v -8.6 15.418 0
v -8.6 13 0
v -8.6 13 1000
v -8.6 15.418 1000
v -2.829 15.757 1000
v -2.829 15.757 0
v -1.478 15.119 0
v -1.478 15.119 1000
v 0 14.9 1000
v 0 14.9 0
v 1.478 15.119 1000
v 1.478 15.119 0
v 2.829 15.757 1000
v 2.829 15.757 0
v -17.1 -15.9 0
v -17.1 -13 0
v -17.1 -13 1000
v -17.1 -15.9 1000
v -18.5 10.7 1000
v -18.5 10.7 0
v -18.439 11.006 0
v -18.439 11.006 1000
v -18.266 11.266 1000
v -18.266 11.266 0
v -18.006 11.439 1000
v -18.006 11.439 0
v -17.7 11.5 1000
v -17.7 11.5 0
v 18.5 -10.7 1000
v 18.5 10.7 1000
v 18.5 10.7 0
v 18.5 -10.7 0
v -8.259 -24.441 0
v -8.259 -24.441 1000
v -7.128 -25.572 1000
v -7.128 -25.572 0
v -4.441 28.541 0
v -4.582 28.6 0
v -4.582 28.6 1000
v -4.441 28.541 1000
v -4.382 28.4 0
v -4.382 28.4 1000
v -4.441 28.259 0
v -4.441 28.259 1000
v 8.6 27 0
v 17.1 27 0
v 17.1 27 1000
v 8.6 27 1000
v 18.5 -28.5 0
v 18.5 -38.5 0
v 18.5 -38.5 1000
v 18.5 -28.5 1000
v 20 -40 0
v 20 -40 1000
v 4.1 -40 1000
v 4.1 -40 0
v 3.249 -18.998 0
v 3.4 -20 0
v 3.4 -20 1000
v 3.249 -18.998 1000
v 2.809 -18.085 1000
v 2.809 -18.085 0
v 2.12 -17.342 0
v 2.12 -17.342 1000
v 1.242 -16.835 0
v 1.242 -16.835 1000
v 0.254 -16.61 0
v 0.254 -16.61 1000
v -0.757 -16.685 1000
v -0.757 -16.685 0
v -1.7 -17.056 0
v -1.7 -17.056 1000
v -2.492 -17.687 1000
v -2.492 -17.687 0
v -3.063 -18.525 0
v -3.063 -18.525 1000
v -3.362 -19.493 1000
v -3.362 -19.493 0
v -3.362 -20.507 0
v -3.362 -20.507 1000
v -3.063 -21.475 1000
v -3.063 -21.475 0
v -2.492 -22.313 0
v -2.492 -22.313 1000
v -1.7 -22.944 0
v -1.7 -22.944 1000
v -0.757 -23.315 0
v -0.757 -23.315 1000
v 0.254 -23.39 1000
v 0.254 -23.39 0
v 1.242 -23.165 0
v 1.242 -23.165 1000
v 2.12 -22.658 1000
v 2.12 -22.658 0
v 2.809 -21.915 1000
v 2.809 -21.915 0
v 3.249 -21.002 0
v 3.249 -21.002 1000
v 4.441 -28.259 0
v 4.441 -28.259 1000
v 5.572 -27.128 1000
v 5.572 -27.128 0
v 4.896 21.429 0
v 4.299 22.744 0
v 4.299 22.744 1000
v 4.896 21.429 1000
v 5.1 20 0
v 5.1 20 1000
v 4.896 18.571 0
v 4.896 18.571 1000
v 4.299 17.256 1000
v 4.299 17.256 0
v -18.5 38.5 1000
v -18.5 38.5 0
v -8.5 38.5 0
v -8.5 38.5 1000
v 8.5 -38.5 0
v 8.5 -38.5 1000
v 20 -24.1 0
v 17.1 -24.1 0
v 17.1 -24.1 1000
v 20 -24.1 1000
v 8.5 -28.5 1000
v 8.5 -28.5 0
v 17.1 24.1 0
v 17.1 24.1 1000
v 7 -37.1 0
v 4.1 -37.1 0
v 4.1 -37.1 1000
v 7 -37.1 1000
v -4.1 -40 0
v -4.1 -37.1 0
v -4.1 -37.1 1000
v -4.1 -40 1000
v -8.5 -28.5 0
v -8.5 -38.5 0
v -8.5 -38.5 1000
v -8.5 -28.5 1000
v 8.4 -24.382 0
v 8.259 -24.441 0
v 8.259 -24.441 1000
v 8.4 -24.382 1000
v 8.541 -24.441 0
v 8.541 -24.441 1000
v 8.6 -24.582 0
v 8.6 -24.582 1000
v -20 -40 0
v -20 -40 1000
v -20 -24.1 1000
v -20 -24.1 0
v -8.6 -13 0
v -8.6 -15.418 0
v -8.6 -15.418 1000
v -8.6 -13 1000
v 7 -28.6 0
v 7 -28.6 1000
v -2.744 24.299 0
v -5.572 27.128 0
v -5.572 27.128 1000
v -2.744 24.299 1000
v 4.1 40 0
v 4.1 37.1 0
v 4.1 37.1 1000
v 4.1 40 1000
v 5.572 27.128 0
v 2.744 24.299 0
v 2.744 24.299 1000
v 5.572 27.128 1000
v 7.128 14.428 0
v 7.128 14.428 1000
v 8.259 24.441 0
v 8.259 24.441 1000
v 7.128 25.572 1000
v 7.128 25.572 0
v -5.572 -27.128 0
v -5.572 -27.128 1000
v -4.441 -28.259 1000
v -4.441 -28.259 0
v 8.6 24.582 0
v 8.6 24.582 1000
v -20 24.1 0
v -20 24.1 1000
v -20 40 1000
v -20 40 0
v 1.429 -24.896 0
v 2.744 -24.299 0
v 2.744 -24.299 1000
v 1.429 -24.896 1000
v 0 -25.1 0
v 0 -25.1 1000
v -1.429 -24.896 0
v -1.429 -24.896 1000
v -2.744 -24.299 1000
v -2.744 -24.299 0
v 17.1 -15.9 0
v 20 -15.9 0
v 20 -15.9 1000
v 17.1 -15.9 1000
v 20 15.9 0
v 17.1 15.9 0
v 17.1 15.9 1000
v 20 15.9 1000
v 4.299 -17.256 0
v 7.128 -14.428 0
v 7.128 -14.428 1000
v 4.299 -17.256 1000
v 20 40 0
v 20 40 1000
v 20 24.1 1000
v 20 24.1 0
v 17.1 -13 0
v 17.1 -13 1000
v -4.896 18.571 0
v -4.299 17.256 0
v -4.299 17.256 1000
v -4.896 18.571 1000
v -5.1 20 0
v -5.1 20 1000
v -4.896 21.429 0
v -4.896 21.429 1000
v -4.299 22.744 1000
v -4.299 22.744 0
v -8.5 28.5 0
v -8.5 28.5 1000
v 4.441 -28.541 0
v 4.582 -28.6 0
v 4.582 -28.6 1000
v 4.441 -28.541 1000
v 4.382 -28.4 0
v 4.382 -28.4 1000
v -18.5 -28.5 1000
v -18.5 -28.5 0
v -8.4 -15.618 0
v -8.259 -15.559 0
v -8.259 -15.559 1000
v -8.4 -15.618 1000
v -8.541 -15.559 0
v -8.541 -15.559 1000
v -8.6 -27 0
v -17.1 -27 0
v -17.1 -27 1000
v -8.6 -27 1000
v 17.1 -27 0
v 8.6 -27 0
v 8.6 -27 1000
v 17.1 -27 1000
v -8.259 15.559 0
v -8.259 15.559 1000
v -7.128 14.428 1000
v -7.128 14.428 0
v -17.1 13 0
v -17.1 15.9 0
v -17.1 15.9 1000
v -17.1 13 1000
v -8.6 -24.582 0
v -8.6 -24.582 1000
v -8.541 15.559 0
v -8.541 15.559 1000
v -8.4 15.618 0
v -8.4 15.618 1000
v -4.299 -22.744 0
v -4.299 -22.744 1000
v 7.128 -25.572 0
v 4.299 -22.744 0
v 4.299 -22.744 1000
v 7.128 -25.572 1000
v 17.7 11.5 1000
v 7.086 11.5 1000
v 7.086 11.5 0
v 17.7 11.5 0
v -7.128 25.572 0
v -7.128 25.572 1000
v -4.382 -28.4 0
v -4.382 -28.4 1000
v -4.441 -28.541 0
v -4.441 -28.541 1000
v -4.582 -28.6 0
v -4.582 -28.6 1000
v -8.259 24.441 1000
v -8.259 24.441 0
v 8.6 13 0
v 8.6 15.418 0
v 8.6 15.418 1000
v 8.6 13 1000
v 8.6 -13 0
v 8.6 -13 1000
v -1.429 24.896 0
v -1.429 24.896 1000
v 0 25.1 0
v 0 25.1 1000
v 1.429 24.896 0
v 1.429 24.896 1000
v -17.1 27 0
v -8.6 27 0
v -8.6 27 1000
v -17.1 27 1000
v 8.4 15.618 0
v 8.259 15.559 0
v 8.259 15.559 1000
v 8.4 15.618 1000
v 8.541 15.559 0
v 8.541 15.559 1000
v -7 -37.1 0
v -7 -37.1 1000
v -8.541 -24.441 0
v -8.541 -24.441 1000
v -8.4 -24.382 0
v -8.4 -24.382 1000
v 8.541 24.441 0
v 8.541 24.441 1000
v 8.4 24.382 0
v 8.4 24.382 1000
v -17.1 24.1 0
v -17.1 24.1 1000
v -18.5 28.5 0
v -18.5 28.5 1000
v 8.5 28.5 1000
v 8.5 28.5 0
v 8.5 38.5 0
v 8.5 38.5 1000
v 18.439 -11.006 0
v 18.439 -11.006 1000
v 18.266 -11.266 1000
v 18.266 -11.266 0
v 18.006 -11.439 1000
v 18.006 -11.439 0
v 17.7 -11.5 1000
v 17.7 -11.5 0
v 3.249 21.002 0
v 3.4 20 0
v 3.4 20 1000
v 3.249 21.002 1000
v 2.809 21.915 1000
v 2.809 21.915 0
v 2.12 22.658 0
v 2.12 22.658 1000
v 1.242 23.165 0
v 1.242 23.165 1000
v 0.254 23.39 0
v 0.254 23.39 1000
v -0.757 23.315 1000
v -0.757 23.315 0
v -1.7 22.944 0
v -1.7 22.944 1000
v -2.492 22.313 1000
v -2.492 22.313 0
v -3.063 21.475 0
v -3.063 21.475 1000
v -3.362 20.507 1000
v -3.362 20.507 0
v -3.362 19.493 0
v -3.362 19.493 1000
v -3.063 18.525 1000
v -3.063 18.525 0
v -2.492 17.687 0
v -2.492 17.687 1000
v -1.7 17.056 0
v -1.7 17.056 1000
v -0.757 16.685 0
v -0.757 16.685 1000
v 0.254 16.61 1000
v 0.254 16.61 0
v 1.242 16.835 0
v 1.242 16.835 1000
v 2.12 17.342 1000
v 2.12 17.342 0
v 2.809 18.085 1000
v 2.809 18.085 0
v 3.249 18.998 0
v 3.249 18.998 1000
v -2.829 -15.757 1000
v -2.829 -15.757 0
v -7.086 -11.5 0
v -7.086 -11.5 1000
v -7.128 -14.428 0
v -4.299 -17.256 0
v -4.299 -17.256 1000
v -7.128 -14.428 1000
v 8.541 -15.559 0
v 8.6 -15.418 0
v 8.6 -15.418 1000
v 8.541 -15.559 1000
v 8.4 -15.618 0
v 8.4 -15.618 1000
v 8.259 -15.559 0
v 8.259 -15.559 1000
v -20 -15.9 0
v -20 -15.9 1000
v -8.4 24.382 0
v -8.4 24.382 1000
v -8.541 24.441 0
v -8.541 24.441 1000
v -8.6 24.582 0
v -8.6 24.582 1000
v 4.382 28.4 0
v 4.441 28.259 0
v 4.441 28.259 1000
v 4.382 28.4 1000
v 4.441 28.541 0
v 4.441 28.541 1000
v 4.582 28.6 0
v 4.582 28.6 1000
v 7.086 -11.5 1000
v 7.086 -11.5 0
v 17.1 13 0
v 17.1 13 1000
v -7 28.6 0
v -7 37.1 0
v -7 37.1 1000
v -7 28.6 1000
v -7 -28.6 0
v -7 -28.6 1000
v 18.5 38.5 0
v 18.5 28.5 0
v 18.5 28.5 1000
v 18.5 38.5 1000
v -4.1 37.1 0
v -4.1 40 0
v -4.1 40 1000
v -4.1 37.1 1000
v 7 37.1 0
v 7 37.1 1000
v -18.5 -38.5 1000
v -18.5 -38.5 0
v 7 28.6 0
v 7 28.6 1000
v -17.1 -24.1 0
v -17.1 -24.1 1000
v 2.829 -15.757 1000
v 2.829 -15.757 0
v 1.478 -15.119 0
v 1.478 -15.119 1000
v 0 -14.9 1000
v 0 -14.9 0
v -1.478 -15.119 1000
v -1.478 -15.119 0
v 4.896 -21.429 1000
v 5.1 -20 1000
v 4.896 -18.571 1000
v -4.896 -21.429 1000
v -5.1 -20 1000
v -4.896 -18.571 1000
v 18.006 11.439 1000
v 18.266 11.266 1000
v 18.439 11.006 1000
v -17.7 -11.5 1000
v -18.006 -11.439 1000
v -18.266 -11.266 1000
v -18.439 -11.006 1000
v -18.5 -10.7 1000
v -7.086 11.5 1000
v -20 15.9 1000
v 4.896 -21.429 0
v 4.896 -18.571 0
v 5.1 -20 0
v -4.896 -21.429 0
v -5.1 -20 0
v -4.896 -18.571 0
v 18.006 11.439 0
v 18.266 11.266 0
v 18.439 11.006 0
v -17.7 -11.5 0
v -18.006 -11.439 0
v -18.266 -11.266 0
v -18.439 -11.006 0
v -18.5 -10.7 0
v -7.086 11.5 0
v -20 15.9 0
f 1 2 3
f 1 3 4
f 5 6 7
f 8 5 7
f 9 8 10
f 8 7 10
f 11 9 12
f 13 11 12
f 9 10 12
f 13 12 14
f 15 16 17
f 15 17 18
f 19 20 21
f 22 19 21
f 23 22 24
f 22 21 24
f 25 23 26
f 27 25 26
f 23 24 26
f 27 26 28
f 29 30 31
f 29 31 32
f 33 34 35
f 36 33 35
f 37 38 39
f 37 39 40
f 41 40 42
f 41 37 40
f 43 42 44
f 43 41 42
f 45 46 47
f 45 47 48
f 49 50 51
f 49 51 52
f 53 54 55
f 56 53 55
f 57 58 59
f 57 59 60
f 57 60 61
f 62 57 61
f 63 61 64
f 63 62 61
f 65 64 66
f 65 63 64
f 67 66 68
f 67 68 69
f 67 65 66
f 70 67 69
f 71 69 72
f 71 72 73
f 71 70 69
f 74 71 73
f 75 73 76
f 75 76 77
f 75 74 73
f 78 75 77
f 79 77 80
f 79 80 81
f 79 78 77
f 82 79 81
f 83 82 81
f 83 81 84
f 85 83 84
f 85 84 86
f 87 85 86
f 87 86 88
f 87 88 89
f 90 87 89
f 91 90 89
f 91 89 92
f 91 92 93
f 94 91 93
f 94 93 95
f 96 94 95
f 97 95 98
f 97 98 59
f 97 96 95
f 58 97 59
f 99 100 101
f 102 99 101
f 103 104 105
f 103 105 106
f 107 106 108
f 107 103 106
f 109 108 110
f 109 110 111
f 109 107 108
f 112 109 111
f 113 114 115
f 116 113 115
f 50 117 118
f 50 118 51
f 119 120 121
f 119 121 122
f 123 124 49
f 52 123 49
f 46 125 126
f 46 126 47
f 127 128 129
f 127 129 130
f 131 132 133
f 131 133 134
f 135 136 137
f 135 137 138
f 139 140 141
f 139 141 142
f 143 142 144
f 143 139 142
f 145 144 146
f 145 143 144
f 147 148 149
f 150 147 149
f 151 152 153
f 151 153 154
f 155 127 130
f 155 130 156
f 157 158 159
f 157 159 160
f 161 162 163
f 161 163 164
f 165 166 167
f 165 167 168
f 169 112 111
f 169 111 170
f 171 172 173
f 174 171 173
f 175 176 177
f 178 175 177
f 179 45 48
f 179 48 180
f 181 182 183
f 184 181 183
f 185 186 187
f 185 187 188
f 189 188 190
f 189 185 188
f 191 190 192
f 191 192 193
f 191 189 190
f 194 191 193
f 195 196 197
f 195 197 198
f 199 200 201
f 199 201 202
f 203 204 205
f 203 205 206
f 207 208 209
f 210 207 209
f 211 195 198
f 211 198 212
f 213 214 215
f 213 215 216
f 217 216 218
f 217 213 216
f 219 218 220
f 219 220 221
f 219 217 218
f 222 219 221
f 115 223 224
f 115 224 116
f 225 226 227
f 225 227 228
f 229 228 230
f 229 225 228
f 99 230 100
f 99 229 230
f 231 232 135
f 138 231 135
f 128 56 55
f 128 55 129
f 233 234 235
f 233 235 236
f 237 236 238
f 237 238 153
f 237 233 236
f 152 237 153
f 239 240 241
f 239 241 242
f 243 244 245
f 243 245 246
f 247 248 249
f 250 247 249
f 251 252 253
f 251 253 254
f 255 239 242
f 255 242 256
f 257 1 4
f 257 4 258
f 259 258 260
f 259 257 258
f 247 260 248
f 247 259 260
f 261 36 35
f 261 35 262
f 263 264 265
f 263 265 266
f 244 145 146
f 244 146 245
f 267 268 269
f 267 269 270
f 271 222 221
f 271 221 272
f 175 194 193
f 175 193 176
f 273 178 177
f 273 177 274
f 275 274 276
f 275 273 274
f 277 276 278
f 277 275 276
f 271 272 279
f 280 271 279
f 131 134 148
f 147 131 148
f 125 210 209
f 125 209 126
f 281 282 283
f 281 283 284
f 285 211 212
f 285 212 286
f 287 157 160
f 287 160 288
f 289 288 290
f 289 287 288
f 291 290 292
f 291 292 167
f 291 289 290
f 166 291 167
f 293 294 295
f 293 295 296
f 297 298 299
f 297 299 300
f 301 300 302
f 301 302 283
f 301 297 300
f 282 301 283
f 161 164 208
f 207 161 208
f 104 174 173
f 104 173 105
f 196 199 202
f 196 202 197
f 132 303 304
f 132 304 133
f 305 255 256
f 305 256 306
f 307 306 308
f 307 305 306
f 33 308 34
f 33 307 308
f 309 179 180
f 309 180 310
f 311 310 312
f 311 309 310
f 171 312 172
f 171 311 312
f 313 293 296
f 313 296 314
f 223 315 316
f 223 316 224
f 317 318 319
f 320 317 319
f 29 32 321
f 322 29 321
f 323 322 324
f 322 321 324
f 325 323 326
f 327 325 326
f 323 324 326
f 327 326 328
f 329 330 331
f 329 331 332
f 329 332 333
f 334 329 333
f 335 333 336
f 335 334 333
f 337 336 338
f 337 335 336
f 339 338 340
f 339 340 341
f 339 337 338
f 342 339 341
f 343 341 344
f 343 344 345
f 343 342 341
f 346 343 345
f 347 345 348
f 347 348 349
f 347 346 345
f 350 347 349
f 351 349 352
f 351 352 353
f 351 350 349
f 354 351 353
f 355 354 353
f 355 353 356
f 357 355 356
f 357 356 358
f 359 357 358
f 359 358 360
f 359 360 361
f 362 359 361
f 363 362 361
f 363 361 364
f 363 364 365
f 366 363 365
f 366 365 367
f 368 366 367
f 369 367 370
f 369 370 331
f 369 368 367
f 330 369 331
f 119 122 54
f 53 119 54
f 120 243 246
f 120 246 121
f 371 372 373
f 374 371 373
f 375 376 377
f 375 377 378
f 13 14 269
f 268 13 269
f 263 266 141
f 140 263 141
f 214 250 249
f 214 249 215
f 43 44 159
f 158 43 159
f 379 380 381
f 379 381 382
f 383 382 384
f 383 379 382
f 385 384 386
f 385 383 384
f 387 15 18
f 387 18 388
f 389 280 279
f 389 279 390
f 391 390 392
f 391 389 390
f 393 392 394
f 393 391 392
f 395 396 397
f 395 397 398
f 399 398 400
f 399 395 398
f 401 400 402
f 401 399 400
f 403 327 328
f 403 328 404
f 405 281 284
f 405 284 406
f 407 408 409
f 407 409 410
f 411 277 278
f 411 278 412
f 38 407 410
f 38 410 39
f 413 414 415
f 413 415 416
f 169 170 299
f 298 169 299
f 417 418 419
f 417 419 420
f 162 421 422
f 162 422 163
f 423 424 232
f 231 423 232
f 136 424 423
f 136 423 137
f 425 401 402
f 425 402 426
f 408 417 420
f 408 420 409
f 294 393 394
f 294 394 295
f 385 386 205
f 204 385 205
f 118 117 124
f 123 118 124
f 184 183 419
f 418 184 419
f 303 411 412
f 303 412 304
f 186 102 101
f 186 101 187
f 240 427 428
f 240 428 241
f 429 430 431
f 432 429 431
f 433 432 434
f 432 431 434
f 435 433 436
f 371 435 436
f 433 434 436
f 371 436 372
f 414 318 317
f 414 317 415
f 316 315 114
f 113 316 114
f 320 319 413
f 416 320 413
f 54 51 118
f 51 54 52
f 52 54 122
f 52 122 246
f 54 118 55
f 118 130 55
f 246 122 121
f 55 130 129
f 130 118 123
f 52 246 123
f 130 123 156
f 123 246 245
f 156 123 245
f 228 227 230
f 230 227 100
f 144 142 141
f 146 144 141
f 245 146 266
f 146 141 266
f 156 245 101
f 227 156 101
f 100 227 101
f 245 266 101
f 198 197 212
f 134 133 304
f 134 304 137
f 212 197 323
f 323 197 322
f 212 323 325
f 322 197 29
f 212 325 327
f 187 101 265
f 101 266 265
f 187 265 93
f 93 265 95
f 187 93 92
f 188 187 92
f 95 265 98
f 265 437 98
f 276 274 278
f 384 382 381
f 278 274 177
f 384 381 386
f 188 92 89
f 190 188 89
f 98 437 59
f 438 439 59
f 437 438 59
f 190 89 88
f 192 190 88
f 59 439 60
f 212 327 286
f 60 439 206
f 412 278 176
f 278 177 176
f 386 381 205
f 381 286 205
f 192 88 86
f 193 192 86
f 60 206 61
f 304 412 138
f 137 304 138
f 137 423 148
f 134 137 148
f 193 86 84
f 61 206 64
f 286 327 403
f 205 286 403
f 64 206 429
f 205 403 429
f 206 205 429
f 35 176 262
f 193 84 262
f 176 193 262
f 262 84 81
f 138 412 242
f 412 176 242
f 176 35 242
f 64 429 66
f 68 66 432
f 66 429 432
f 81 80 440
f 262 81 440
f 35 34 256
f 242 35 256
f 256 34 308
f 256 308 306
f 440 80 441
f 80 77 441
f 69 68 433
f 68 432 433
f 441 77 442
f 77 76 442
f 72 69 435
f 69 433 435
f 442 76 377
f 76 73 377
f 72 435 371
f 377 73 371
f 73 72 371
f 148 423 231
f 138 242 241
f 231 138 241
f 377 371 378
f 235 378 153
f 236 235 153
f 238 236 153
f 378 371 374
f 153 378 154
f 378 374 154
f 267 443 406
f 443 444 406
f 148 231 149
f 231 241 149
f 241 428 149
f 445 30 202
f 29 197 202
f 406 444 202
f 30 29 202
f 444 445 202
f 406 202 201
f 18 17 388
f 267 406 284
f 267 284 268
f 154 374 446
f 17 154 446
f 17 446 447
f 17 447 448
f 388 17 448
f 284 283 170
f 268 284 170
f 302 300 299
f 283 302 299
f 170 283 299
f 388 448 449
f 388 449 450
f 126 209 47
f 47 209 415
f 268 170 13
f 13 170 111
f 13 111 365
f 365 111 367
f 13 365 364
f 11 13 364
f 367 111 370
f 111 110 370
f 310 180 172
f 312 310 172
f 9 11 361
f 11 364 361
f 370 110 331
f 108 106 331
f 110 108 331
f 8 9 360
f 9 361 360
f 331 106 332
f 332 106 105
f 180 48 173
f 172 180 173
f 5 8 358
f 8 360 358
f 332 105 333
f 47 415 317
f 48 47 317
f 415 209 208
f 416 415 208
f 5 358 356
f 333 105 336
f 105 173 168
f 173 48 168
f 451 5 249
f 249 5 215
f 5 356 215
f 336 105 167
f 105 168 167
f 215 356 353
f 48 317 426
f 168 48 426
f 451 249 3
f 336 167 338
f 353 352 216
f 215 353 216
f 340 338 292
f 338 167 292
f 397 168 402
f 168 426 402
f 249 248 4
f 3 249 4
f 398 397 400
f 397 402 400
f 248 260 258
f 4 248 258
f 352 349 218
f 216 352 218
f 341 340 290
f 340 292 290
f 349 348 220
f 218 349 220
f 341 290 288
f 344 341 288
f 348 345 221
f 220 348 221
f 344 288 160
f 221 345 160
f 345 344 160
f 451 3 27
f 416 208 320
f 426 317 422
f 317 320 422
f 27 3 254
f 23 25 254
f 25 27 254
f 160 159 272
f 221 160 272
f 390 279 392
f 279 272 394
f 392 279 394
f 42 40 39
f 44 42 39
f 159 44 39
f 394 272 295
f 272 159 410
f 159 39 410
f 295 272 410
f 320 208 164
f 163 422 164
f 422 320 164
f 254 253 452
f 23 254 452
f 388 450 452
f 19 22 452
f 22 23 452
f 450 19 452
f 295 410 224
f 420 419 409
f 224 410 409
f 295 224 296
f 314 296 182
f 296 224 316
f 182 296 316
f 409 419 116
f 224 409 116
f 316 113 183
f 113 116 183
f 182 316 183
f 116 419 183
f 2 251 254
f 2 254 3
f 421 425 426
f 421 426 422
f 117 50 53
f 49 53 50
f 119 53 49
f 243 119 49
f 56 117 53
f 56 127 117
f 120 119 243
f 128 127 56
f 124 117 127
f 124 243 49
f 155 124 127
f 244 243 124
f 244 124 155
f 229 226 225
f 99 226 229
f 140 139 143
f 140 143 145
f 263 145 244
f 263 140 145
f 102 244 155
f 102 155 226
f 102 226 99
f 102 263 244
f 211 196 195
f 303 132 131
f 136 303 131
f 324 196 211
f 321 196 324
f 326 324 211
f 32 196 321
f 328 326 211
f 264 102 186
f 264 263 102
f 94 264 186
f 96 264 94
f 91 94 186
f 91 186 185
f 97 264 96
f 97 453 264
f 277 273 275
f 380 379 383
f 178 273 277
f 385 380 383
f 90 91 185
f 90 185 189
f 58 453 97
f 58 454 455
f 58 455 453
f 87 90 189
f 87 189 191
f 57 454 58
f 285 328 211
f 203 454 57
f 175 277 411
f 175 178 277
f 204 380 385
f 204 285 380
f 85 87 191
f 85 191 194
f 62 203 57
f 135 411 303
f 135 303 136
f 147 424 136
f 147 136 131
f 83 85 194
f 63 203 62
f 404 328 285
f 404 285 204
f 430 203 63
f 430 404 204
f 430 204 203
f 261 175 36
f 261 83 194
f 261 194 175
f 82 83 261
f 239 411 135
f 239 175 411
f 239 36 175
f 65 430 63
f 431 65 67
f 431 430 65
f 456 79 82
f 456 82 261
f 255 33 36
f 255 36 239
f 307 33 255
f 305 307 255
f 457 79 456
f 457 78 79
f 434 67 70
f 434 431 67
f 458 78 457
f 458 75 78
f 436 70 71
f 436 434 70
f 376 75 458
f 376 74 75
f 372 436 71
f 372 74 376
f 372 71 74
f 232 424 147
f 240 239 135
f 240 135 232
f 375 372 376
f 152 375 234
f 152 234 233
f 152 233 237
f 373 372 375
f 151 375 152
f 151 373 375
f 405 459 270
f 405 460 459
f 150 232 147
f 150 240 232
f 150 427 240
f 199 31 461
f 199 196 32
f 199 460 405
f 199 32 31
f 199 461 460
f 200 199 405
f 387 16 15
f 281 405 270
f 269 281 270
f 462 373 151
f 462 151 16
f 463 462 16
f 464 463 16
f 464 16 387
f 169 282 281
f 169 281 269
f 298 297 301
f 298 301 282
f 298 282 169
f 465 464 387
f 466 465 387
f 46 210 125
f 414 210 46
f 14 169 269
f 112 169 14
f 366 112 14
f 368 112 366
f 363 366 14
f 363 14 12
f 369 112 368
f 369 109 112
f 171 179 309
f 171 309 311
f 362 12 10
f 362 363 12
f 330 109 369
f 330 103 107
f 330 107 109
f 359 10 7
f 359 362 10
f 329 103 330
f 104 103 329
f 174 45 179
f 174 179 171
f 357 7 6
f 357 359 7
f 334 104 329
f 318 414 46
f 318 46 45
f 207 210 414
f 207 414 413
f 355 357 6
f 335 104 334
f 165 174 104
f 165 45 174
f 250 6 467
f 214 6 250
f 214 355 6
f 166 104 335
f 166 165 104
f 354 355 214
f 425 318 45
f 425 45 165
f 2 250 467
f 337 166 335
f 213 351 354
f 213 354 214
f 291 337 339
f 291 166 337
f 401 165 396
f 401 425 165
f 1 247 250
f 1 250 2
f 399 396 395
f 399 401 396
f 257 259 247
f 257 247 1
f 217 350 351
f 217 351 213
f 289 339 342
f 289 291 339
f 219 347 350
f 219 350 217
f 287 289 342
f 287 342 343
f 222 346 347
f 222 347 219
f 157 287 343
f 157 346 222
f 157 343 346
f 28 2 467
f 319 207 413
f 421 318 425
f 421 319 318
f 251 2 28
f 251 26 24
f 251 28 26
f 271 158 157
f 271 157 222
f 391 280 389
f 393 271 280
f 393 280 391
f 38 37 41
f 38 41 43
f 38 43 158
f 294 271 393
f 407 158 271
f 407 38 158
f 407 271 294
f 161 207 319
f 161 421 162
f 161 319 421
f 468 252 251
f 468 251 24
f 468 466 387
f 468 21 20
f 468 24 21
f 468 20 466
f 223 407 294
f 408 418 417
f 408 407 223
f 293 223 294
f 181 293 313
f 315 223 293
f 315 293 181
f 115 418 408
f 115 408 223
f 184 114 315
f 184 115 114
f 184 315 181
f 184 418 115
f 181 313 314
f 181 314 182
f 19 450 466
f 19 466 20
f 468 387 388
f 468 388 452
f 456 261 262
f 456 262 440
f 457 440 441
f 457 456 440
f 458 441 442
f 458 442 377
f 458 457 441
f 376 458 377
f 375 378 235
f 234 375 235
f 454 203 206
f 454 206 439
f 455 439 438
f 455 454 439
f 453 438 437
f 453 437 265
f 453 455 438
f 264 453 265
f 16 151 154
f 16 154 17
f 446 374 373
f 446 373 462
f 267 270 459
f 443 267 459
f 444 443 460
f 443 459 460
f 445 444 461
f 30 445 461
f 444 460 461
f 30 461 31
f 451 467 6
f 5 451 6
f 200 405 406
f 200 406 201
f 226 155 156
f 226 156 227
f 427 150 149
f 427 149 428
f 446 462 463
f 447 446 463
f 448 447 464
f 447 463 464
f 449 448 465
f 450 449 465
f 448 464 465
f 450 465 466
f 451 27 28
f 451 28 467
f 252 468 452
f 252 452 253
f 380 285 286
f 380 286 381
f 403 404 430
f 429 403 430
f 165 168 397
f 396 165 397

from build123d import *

# Parameters (mm, degrees)
SKETCH_1_R      = 3.4
SKETCH_1_W      = 10
SKETCH_1_H      = 10
EXTRUDE_1_DEPTH = 1000


with BuildPart() as part:
    # Эскиз1 → Бобышка-Вытянуть1 (new body)
    with BuildSketch(Plane.XY):
        with BuildLine():
            Line((-20, 27), (-20, 40))
            Line((-20, 40), (-7, 40))
            Line((-7, 40), (-4.1, 40))
            Line((-4.1, 40), (-4.1, 37.1))
            Line((-4.1, 37.1), (-7, 37.1))
            Line((-7, 37.1), (-7, 28.6))
            Line((-7, 28.6), (-4.582423707, 28.6))
            ThreePointArc((-4.582423707, 28.6), (-4.3976478, 28.476536686), (-4.44100235, 28.258578644))
            Line((-4.44100235, 28.258578644), (-5.571973038, 27.127607956))
            Line((-5.571973038, 27.127607956), (-2.743545913, 24.299180832))
            ThreePointArc((-2.743545913, 24.299180832), (0, 25.1), (2.743545913, 24.299180832))
            Line((2.743545913, 24.299180832), (5.571973038, 27.127607956))
            Line((5.571973038, 27.127607956), (4.44100235, 28.258578644))
            ThreePointArc((4.44100235, 28.258578644), (4.3976478, 28.476536686), (4.582423707, 28.6))
            Line((4.582423707, 28.6), (7, 28.6))
            Line((7, 28.6), (7, 37.1))
            Line((7, 37.1), (4.1, 37.1))
            Line((4.1, 37.1), (4.1, 40))
            Line((4.1, 40), (7, 40))
            Line((7, 40), (20, 40))
            Line((20, 40), (20, 27))
            Line((20, 27), (20, 24.1))
            Line((20, 24.1), (17.1, 24.1))
            Line((17.1, 24.1), (17.1, 27))
            Line((17.1, 27), (8.6, 27))
            Line((8.6, 27), (8.6, 24.582423707))
            ThreePointArc((8.6, 24.582423707), (8.476536686, 24.3976478), (8.258578644, 24.44100235))
            Line((8.258578644, 24.44100235), (7.127607956, 25.571973038))
            Line((7.127607956, 25.571973038), (4.299180832, 22.743545913))
            ThreePointArc((4.299180832, 22.743545913), (5.1, 20), (4.299180832, 17.256454087))
            Line((4.299180832, 17.256454087), (7.127607956, 14.428026962))
            Line((7.127607956, 14.428026962), (8.258578644, 15.55899765))
            ThreePointArc((8.258578644, 15.55899765), (8.476536686, 15.6023522), (8.6, 15.417576293))
            Line((8.6, 15.417576293), (8.6, 13))
            Line((8.6, 13), (17.1, 13))
            Line((17.1, 13), (17.1, 15.9))
            Line((17.1, 15.9), (20, 15.9))
            Line((20, 15.9), (20, 13))
            Line((20, 13), (20, -13))
            Line((20, -13), (20, -15.9))
            Line((20, -15.9), (17.1, -15.9))
            Line((17.1, -15.9), (17.1, -13))
            Line((17.1, -13), (8.6, -13))
            Line((8.6, -13), (8.6, -15.417576293))
            ThreePointArc((8.6, -15.417576293), (8.476536686, -15.6023522), (8.258578644, -15.55899765))
            Line((8.258578644, -15.55899765), (7.127607956, -14.428026962))
            Line((7.127607956, -14.428026962), (4.299180832, -17.256454087))
            ThreePointArc((4.299180832, -17.256454087), (5.1, -20), (4.299180832, -22.743545913))
            Line((4.299180832, -22.743545913), (7.127607956, -25.571973038))
            Line((7.127607956, -25.571973038), (8.258578644, -24.44100235))
            ThreePointArc((8.258578644, -24.44100235), (8.476536686, -24.3976478), (8.6, -24.582423707))
            Line((8.6, -24.582423707), (8.6, -27))
            Line((8.6, -27), (17.1, -27))
            Line((17.1, -27), (17.1, -24.1))
            Line((17.1, -24.1), (20, -24.1))
            Line((20, -24.1), (20, -27))
            Line((20, -27), (20, -40))
            Line((20, -40), (7, -40))
            Line((7, -40), (4.1, -40))
            Line((4.1, -40), (4.1, -37.1))
            Line((4.1, -37.1), (7, -37.1))
            Line((7, -37.1), (7, -28.6))
            Line((7, -28.6), (4.582423707, -28.6))
            ThreePointArc((4.582423707, -28.6), (4.3976478, -28.476536686), (4.44100235, -28.258578644))
            Line((4.44100235, -28.258578644), (5.571973038, -27.127607956))
            Line((5.571973038, -27.127607956), (2.743545913, -24.299180832))
            ThreePointArc((2.743545913, -24.299180832), (0, -25.1), (-2.743545913, -24.299180832))
            Line((-2.743545913, -24.299180832), (-5.571973038, -27.127607956))
            Line((-5.571973038, -27.127607956), (-4.44100235, -28.258578644))
            ThreePointArc((-4.44100235, -28.258578644), (-4.3976478, -28.476536686), (-4.582423707, -28.6))
            Line((-4.582423707, -28.6), (-7, -28.6))
            Line((-7, -28.6), (-7, -37.1))
            Line((-7, -37.1), (-4.1, -37.1))
            Line((-4.1, -37.1), (-4.1, -40))
            Line((-4.1, -40), (-7, -40))
            Line((-7, -40), (-20, -40))
            Line((-20, -40), (-20, -27))
            Line((-20, -27), (-20, -24.1))
            Line((-20, -24.1), (-17.1, -24.1))
            Line((-17.1, -24.1), (-17.1, -27))
            Line((-17.1, -27), (-8.6, -27))
            Line((-8.6, -27), (-8.6, -24.582423707))
            ThreePointArc((-8.6, -24.582423707), (-8.476536686, -24.3976478), (-8.258578644, -24.44100235))
            Line((-8.258578644, -24.44100235), (-7.127607956, -25.571973038))
            Line((-7.127607956, -25.571973038), (-4.299180832, -22.743545913))
            ThreePointArc((-4.299180832, -22.743545913), (-5.1, -20), (-4.299180832, -17.256454087))
            Line((-4.299180832, -17.256454087), (-7.127607956, -14.428026962))
            Line((-7.127607956, -14.428026962), (-8.258578644, -15.55899765))
            ThreePointArc((-8.258578644, -15.55899765), (-8.476536686, -15.6023522), (-8.6, -15.417576293))
            Line((-8.6, -15.417576293), (-8.6, -13))
            Line((-8.6, -13), (-17.1, -13))
            Line((-17.1, -13), (-17.1, -15.9))
            Line((-17.1, -15.9), (-20, -15.9))
            Line((-20, -15.9), (-20, -13))
            Line((-20, -13), (-20, 13))
            Line((-20, 13), (-20, 15.9))
            Line((-20, 15.9), (-17.1, 15.9))
            Line((-17.1, 15.9), (-17.1, 13))
            Line((-17.1, 13), (-8.6, 13))
            Line((-8.6, 13), (-8.6, 15.417576293))
            ThreePointArc((-8.6, 15.417576293), (-8.476536686, 15.6023522), (-8.258578644, 15.55899765))
            Line((-8.258578644, 15.55899765), (-7.127607956, 14.428026962))
            Line((-7.127607956, 14.428026962), (-4.299180832, 17.256454087))
            ThreePointArc((-4.299180832, 17.256454087), (-5.1, 20), (-4.299180832, 22.743545913))
            Line((-4.299180832, 22.743545913), (-7.127607956, 25.571973038))
            Line((-7.127607956, 25.571973038), (-8.258578644, 24.44100235))
            ThreePointArc((-8.258578644, 24.44100235), (-8.476536686, 24.3976478), (-8.6, 24.582423707))
            Line((-8.6, 24.582423707), (-8.6, 27))
            Line((-8.6, 27), (-17.1, 27))
            Line((-17.1, 27), (-17.1, 24.1))
            Line((-17.1, 24.1), (-20, 24.1))
            Line((-20, 24.1), (-20, 27))
        make_face()
        with Locations((0, 20)):
            Circle(SKETCH_1_R, mode=Mode.SUBTRACT)
        with Locations((0, -20)):
            Circle(SKETCH_1_R, mode=Mode.SUBTRACT)
        with Locations((13.5, 33.5)):
            Rectangle(SKETCH_1_W, SKETCH_1_H, mode=Mode.SUBTRACT)
        with Locations((-13.5, 33.5)):
            Rectangle(SKETCH_1_W, SKETCH_1_H, mode=Mode.SUBTRACT)
        with Locations((13.5, -33.5)):
            Rectangle(SKETCH_1_W, SKETCH_1_H, mode=Mode.SUBTRACT)
        with Locations((-13.5, -33.5)):
            Rectangle(SKETCH_1_W, SKETCH_1_H, mode=Mode.SUBTRACT)
        with BuildLine():
            Line((-17.7, 11.5), (-7.085786438, 11.5))
            Line((-7.085786438, 11.5), (-2.829134161, 15.756652277))
            ThreePointArc((-2.829134161, 15.756652277), (0, 14.9), (2.829134161, 15.756652277))
            Line((2.829134161, 15.756652277), (7.085786438, 11.5))
            Line((7.085786438, 11.5), (17.7, 11.5))
            ThreePointArc((17.7, 11.5), (18.265685425, 11.265685425), (18.5, 10.7))
            Line((18.5, 10.7), (18.5, -10.7))
            ThreePointArc((18.5, -10.7), (18.265685425, -11.265685425), (17.7, -11.5))
            Line((17.7, -11.5), (7.085786438, -11.5))
            Line((7.085786438, -11.5), (2.829134161, -15.756652277))
            ThreePointArc((2.829134161, -15.756652277), (0, -14.9), (-2.829134161, -15.756652277))
            Line((-2.829134161, -15.756652277), (-7.085786438, -11.5))
            Line((-7.085786438, -11.5), (-17.7, -11.5))
            ThreePointArc((-17.7, -11.5), (-18.265685425, -11.265685425), (-18.5, -10.7))
            Line((-18.5, -10.7), (-18.5, 10.7))
            ThreePointArc((-18.5, 10.7), (-18.265685425, 11.265685425), (-17.7, 11.5))
        make_face(mode=Mode.SUBTRACT)
    extrude(amount=EXTRUDE_1_DEPTH)


solid = part.part
